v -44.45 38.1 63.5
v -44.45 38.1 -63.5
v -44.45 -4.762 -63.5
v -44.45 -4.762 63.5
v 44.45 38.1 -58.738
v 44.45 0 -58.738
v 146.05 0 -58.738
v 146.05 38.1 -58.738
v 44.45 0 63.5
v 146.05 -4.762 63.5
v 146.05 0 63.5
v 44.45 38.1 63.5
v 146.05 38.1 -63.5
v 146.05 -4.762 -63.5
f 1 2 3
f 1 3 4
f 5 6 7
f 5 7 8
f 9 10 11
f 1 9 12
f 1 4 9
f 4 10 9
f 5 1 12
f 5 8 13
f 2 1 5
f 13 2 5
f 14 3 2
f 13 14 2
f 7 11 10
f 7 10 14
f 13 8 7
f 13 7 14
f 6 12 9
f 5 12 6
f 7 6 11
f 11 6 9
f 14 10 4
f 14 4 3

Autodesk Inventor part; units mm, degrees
ref_plane "YZ Plane" through (0, 0, 0) normal (1, 0, 0) x (0, 1, 0)
ref_plane "XZ Plane" through (0, 0, 0) normal (0, 1, 0) x (-1, 0, 0)
ref_plane "XY Plane" through (0, 0, 0) normal (0, 0, 1) x (1, 0, 0)
sketch "Sketch2" plane through (0, 0, 0) normal (0, 1, 0) x (-1, 0, 0)
  line L0 (44.45, 63.5) -> (-44.45, 63.5)
  line L1 (-44.45, 63.5) -> (-44.45, -63.5)
  line L2 (-44.45, -63.5) -> (44.45, -63.5)
  line L3 (44.45, -63.5) -> (44.45, 63.5)
  line L4 (44.45, 63.5) -> (-44.45, -63.5) construction
  line L5 (-44.45, 63.5) -> (44.45, -63.5) construction
  point P0 (0, 0)
  dimension "d0" = 127
  dimension "d1" = 88.9
extrude "Extrusion1" add sketch "Sketch2" against normal blind 4.7625
sketch "Sketch4" plane through (0, 0, 0) normal (0, 1, 0) x (1, 0, 0)
  line L0 (-44.45, -63.5) -> (-44.45, 63.5) projected
  line L1 (44.45, 63.5) -> (44.45, -63.5) projected
  line L2 (-44.45, 63.5) -> (44.45, 63.5)
  line L3 (44.45, 63.5) -> (44.45, 58.7375)
  line L4 (44.45, 58.7375) -> (-44.45, 58.7375)
  line L5 (-44.45, 58.7375) -> (-44.45, 63.5)
  point P0 (0, 0)
  point P1 (-44.45, 58.7375)
  dimension "d4" = 4.7625
extrude "Extrusion2" add sketch "Sketch4" along normal blind 38.1
sketch "Sketch5" plane through (0, 0, 0) normal (0, 1, 0) x (1, 0, 0)
  line L0 (44.45, -63.5) -> (-44.45, -63.5) projected
  line L1 (-44.45, 58.7375) -> (44.45, 58.7375) projected
  line L2 (-44.45, -63.5) -> (-41.275, -63.5)
  line L3 (-41.275, -63.5) -> (-41.275, 58.7375)
  line L4 (-44.45, 58.7375) -> (-44.45, -63.5)
  line L5 (44.45, 63.5) -> (44.45, -63.5) projected
  line L6 (44.45, -63.5) -> (41.275, -63.5)
  line L7 (-44.45, 58.7375) -> (-44.45, -63.5) projected
  line L8 (-44.45, -63.5) -> (-44.45, 63.5) projected
  line L9 (-44.45, 58.7375) -> (-44.45, 63.5)
  line L10 (-44.45, 63.5) -> (-41.275, 63.5)
  line L11 (-44.45, 63.5) -> (44.45, 63.5) projected
  line L12 (-41.275, 58.7375) -> (-41.275, 63.5)
  line L13 (44.45, 58.7375) -> (-44.45, 58.7375) projected
  point P0 (0, 0)
  point P1 (-44.45, 58.7375)
  point P2 (41.275, 63.5)
  dimension "d7" = 3.175
extrude "Extrusion3" add sketch "Sketch5" along normal blind 38.1
sketch "Sketch6" plane through (0, 0, 0) normal (0, 1, 0) x (1, 0, 0)
  line L0 (-41.275, -63.5) -> (41.275, -63.5) projected
  line L1 (-41.275, 58.7375) -> (41.275, 58.7375) projected
  line L2 (-22.225, -63.5) -> (-19.05, -63.5)
  line L3 (-19.05, -63.5) -> (-19.05, 58.7375)
  line L4 (-19.05, 58.7375) -> (-22.225, 58.7375)
  line L5 (-22.225, 58.7375) -> (-22.225, -63.5)
  line L6 (0, -63.5) -> (3.175, -63.5)
  line L7 (3.175, -63.5) -> (3.175, 58.7375)
  line L8 (3.175, 58.7375) -> (0, 58.7375)
  line L9 (0, 58.7375) -> (0, -63.5)
  line L10 (15.875, -63.5) -> (19.05, -63.5)
  line L11 (19.05, -63.5) -> (19.05, 58.7375)
  line L12 (19.05, 58.7375) -> (15.875, 58.7375)
  line L13 (15.875, 58.7375) -> (15.875, -63.5)
  line L14 (-41.275, -63.5) -> (-41.275, 58.7375) projected
  point P0 (0, 0)
  point P1 (15.875, -63.5)
  point P2 (19.05, -63.5)
  point P3 (19.05, 58.7375)
  point P4 (0, 58.7375)
  point P5 (0, -63.5)
  point P6 (3.175, -63.5)
  dimension "d11" = 3.175
  dimension "d12" = 3.175
  dimension "d13" = 3.175
  dimension "d49" = 19.05
  dimension "d50" = 19.05
  dimension "d51" = 12.7
extrude "Extrusion4" add sketch "Sketch6" along normal blind 38.1 contours L5 L1 L3 L0 | L9 L1 L7 L0 | L13 L1 L11 L0
sketch "Sketch9" plane through (44.45, -4.7625, 63.5) normal (1, 0, 0) x (0, 0, -1)
  line L0 (0, 0) -> (0, 42.8625) projected
  line L1 (127, 0) -> (127, 42.8625) projected
  line L2 (0, 0) -> (127, 0)
  line L3 (127, 0) -> (127, 4.7625)
  line L4 (127, 4.7625) -> (0, 4.7625)
  line L5 (0, 4.7625) -> (0, 0)
  point P0 (63.5, 4.7625)
  dimension "d37" = 4.7625
extrude "Extrusion5" add sketch "Sketch9" along normal blind 101.6
sketch "Sketch10" plane through (44.45, 38.1, 63.5) normal (1, 0, 0) x (0, 0, -1)
  line L0 (127, -38.1) -> (127, 0) projected
  line L1 (122.2375, 0) -> (0, 0) projected
  line L2 (127, -38.1) -> (122.2375, -38.1)
  line L3 (122.2375, -38.1) -> (122.2375, 0)
  line L4 (122.2375, 0) -> (127, 0)
  line L5 (127, 0) -> (127, -38.1)
  point P0 (63.5, -38.1)
extrude "Extrusion6" add sketch "Sketch10" along normal blind 101.6
equation "\"d0\" = depth"
equation "\"d1\" = width"
equation "\"d2\" = baseThickness"
equation "\"d4\" = backThickness"
equation "\"d5\" = backHeight"
equation "\"d7\" = edgeThickness"
equation "\"d9\" = edgeHeight"
equation "\"d11\" = dividerThickness"
equation "\"d12\" = dividerThickness"
equation "\"d13\" = dividerThickness"
equation "\"d19\" = dividerHeight"
equation "\"d37\" = baseThickness"
equation "\"d38\" = waterShelfWidth"
equation "\"d40\" = waterShelfWidth"
equation "\"baseThickness\" = 4.7625"
equation "\"width\" = 88.9"
equation "\"depth\" = 127"
equation "\"backHeight\" = 38.1"
equation "\"backThickness\" = 4.7625"
equation "\"edgeThickness\" = 3.175"
equation "\"edgeHeight\" = 38.1"
equation "\"dividerThickness\" = 3.175"
equation "\"dividerHeight\" = 38.1"
equation "\"waterShelfWidth\" = 101.6"
properties part number "shelfForElectronicsV01"
